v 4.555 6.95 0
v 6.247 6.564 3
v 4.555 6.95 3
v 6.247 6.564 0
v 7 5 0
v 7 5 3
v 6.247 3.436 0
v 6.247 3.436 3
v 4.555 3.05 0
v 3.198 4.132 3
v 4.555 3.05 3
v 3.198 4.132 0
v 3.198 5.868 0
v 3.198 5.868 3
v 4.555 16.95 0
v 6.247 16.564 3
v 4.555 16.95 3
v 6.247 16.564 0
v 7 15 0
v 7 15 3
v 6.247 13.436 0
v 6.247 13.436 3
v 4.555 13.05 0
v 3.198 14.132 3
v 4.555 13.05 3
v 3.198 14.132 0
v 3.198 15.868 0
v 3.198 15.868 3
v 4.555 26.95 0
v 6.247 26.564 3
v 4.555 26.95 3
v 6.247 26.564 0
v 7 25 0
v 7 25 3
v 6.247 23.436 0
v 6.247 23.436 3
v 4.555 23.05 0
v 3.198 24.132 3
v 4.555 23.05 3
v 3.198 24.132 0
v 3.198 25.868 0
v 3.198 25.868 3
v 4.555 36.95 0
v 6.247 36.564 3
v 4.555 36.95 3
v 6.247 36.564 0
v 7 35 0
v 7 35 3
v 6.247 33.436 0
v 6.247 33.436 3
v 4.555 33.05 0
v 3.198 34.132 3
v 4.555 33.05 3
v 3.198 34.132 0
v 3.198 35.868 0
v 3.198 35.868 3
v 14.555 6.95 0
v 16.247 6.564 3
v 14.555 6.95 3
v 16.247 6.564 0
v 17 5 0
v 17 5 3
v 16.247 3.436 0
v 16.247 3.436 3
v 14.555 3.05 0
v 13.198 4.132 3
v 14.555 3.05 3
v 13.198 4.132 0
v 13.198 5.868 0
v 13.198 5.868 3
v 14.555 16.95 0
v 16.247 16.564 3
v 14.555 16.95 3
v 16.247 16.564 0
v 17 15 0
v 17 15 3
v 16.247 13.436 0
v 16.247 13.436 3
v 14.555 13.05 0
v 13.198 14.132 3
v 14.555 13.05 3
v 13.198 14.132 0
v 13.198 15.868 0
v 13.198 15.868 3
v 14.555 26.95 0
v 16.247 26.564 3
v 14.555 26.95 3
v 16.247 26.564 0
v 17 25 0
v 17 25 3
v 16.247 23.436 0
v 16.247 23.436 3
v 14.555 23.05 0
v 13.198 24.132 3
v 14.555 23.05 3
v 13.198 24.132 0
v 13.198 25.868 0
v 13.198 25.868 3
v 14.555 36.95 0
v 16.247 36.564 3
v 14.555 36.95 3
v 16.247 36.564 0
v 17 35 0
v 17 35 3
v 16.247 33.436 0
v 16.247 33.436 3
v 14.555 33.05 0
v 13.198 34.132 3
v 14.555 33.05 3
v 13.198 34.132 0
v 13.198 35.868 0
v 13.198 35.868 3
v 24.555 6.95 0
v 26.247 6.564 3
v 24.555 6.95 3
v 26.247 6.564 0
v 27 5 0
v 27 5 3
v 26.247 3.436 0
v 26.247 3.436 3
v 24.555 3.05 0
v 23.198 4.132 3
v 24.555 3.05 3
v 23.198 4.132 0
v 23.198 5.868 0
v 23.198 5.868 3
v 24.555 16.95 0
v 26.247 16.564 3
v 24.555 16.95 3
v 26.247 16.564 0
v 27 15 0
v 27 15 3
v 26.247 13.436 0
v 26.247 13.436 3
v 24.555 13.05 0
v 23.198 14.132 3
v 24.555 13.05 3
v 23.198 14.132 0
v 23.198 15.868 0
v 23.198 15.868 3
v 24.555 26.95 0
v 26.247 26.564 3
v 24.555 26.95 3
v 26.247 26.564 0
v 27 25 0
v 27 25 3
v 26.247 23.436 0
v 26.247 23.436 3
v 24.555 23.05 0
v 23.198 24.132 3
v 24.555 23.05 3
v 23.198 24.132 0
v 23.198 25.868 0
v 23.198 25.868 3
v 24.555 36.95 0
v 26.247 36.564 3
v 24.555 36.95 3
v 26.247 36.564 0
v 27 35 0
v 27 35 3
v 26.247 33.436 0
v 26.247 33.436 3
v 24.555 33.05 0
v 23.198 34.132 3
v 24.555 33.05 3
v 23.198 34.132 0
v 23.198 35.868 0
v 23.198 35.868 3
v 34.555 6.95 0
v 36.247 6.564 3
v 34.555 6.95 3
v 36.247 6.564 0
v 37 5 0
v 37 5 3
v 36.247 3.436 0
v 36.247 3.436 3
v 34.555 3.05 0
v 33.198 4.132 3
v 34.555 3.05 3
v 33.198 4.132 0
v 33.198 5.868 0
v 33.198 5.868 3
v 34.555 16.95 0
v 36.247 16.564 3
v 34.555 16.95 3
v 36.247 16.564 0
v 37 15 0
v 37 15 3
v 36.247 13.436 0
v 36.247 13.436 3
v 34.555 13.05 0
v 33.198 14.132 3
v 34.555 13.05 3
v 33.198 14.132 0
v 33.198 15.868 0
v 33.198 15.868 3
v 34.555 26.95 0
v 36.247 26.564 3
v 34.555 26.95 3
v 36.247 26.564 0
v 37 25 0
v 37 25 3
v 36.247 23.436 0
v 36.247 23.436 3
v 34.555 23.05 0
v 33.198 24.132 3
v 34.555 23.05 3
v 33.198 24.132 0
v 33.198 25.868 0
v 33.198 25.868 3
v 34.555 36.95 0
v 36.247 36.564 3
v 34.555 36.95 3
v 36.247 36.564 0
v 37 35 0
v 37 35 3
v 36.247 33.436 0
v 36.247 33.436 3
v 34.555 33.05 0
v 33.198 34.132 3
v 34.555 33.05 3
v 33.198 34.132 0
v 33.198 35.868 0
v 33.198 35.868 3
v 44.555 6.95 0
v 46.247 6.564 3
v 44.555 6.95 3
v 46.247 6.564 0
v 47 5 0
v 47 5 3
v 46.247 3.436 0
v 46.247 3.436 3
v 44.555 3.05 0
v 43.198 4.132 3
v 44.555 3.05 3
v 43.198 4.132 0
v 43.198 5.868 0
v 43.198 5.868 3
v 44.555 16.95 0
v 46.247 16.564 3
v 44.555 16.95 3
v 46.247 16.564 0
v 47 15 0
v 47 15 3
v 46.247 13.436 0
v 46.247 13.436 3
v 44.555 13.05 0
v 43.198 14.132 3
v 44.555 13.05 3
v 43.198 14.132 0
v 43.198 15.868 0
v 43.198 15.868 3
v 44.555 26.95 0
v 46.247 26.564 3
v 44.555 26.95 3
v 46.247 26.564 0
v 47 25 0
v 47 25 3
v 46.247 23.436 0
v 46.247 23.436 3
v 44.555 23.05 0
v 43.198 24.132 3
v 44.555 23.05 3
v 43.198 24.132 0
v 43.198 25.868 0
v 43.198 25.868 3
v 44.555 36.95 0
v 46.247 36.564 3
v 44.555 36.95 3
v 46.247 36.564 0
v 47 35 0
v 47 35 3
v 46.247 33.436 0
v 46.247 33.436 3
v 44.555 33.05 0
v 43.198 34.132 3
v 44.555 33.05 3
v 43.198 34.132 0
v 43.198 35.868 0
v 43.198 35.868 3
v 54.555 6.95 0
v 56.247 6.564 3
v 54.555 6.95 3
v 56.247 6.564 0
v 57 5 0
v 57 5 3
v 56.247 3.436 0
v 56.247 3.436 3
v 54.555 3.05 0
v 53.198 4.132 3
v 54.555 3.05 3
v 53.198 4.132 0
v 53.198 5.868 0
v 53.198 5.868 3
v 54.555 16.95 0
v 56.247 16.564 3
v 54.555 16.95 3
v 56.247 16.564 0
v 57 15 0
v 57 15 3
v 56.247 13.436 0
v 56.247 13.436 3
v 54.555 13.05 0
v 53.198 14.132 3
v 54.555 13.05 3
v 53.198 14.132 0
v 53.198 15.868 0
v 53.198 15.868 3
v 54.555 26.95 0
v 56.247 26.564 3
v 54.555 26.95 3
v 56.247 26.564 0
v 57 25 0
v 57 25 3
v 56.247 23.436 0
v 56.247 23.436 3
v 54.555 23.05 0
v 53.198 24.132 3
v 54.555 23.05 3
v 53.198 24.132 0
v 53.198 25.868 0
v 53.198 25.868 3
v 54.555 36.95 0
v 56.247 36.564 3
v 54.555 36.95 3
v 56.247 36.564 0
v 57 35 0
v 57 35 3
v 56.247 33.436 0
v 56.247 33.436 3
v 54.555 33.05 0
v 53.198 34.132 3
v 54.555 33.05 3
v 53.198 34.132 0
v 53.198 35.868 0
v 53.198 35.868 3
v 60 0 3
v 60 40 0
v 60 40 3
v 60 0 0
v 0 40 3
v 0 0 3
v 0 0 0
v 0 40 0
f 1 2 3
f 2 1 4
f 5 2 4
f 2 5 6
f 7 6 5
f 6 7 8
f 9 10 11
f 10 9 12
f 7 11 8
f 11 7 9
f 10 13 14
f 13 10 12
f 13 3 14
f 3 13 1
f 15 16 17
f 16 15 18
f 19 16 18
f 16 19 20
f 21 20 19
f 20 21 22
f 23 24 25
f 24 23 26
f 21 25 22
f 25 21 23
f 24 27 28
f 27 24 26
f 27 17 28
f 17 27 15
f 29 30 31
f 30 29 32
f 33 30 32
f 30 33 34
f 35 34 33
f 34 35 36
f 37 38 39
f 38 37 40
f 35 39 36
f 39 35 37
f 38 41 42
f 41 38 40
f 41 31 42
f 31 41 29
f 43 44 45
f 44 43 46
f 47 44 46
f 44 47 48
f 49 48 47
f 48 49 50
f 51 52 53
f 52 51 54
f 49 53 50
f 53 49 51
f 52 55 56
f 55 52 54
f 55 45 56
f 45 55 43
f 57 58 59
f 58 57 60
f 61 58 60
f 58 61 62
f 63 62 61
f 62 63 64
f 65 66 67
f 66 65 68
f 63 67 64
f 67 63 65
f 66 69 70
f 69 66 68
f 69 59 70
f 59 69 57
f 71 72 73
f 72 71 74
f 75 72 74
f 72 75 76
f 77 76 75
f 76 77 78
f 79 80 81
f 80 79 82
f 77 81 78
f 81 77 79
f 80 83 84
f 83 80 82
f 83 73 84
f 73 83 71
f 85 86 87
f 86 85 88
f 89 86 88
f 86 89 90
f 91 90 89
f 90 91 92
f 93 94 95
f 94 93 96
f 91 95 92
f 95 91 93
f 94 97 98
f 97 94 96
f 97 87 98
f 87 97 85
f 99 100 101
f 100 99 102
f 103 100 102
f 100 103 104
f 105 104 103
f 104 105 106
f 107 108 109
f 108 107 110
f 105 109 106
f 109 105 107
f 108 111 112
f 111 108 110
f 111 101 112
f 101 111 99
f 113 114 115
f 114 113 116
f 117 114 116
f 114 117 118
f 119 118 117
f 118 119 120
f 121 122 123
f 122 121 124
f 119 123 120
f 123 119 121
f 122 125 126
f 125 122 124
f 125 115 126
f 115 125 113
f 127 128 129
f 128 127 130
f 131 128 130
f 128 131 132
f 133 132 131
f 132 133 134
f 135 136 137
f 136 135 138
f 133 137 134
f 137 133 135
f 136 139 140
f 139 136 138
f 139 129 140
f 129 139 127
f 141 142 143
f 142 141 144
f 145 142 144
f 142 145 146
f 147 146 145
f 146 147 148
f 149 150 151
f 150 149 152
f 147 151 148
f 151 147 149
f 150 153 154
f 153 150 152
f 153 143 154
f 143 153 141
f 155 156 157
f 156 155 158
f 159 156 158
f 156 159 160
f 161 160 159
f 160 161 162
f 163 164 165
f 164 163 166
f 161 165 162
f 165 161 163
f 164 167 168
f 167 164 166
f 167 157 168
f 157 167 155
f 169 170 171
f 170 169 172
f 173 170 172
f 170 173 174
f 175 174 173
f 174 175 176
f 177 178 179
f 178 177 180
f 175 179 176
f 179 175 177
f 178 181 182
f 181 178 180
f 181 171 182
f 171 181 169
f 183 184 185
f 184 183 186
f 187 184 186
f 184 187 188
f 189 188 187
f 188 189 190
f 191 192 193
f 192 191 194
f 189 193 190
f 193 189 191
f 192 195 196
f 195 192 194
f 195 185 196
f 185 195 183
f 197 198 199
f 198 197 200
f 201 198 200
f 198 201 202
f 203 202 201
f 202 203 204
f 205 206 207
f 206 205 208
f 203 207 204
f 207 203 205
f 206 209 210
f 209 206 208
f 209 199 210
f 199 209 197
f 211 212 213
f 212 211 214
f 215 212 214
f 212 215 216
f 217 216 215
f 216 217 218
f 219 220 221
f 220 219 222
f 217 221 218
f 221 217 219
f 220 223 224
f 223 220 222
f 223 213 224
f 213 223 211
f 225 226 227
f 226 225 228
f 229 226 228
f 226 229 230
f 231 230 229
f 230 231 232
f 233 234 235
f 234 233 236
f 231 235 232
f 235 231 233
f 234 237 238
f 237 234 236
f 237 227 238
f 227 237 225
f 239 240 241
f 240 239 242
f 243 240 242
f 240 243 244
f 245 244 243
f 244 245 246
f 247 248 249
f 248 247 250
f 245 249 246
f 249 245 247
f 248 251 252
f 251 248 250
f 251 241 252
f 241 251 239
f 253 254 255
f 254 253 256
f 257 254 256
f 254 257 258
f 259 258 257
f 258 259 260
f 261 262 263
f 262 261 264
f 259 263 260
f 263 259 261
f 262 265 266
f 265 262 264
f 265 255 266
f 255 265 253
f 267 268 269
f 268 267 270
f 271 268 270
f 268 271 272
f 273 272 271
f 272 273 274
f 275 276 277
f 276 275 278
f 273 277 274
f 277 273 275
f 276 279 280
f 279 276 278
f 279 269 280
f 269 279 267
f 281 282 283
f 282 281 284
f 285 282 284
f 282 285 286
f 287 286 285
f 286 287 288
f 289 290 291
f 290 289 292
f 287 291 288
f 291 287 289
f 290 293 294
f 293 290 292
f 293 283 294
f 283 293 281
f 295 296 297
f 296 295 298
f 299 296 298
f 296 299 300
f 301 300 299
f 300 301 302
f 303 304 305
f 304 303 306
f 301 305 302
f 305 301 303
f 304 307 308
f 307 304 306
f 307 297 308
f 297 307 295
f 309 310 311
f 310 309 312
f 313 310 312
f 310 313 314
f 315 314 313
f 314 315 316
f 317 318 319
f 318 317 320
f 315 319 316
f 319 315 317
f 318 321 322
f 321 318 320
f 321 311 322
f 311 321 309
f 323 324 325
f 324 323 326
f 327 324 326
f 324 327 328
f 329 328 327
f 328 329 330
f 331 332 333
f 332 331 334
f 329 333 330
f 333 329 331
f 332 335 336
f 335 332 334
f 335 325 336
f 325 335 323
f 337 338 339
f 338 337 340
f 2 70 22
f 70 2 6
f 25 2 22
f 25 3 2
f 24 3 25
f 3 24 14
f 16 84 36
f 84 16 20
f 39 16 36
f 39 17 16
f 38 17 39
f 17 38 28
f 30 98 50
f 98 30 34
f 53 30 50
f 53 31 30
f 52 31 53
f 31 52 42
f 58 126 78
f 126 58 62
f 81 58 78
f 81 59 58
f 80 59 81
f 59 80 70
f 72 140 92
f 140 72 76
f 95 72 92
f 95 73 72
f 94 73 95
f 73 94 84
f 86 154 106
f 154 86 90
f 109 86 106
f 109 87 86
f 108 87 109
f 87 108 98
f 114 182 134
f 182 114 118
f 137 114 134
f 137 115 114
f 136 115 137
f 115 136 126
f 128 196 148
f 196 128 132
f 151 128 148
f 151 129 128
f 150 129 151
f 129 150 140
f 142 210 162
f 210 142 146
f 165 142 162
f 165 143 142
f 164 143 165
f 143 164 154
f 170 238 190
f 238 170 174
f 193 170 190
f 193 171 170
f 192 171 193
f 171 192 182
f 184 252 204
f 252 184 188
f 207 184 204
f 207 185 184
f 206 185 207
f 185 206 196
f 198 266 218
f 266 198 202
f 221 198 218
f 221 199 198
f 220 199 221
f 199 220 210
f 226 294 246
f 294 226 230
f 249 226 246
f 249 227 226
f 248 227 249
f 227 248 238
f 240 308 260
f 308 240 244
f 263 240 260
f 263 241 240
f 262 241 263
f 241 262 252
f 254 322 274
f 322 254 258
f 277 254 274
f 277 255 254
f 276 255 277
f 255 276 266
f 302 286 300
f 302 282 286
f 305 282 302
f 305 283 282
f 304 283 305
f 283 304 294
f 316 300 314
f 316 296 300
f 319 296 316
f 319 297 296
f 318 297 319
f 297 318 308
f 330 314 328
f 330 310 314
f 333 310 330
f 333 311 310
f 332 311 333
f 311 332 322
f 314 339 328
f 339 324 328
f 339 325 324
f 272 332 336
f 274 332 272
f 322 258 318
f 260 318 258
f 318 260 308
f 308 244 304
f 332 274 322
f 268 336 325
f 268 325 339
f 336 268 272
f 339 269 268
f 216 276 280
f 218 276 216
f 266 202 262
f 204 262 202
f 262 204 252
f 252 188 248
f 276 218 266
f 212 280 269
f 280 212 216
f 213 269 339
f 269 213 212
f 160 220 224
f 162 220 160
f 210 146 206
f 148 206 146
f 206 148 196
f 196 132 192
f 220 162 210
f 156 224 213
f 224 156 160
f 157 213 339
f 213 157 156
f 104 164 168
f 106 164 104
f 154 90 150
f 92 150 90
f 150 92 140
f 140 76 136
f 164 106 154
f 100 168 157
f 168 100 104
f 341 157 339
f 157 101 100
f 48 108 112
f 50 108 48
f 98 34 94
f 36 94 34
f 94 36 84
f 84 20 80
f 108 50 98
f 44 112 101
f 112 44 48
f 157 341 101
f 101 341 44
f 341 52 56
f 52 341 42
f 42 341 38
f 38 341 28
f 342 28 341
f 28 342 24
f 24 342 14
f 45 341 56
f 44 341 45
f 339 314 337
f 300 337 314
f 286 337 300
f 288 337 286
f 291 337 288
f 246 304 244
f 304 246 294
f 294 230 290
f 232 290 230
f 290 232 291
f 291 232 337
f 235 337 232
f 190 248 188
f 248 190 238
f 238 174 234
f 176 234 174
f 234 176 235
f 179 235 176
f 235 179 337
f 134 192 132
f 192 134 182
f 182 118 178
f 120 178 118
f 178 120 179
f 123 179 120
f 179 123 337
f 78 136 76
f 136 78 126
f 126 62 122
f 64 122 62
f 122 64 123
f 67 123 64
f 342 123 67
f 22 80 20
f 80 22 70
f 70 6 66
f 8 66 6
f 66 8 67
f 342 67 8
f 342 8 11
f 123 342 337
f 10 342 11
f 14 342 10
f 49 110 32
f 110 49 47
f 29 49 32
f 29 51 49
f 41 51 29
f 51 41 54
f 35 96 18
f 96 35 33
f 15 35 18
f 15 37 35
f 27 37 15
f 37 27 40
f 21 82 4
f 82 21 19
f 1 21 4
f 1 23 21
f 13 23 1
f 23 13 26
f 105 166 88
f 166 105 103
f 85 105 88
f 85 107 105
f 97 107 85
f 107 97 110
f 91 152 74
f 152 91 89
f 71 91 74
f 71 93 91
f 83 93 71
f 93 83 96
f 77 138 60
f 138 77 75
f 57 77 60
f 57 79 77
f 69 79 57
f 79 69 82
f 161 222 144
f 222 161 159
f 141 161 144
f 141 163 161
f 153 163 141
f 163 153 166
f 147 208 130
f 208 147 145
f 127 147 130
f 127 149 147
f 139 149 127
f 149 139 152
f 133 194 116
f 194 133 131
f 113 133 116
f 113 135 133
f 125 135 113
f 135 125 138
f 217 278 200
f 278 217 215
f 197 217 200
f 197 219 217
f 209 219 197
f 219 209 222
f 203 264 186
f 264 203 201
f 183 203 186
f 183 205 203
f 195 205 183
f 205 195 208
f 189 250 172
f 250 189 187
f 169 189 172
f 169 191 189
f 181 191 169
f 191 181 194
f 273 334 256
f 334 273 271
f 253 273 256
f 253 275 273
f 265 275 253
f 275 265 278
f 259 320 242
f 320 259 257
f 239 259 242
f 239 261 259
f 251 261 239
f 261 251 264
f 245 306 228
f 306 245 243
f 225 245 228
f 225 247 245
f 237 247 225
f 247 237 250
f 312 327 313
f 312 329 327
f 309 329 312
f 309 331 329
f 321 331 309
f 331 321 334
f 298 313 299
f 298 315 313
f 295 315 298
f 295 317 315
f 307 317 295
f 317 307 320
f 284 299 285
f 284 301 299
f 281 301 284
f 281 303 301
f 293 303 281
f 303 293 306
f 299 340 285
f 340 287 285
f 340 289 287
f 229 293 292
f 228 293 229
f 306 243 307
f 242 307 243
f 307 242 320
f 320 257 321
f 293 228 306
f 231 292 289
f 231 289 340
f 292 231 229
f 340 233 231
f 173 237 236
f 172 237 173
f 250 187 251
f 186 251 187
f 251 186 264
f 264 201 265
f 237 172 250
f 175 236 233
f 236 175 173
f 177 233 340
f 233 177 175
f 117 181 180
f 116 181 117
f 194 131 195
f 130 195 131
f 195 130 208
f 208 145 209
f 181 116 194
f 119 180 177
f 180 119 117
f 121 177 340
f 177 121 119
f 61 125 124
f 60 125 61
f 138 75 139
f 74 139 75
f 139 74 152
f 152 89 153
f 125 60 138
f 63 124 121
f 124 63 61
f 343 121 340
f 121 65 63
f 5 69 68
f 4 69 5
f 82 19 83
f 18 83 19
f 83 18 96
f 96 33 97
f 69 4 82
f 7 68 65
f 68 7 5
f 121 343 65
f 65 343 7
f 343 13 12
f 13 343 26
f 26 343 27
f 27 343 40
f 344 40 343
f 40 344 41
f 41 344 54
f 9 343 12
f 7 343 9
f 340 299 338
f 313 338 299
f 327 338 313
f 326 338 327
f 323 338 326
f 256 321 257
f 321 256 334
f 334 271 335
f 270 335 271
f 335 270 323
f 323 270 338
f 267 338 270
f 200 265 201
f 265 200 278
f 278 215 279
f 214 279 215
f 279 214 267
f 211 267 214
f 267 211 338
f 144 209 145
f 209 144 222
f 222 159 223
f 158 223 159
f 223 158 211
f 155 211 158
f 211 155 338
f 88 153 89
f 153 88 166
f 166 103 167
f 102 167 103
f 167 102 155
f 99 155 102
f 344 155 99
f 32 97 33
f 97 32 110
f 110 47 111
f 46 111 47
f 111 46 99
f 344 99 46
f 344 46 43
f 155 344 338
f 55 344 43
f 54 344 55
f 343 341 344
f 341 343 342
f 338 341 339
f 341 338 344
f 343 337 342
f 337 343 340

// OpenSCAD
// Purpose: perforated plate – a for loop with two variables creates a grid of holes.
nx = 6;
ny = 4;
pitch = 10;
t = 3;
echo(holes = nx * ny);
difference() {
    cube([nx * pitch, ny * pitch, t]);
    for (i = [0 : nx - 1], j = [0 : ny - 1])
        translate([pitch / 2 + i * pitch, pitch / 2 + j * pitch, -1])
            cylinder(h = t + 2, d = 4);
}
